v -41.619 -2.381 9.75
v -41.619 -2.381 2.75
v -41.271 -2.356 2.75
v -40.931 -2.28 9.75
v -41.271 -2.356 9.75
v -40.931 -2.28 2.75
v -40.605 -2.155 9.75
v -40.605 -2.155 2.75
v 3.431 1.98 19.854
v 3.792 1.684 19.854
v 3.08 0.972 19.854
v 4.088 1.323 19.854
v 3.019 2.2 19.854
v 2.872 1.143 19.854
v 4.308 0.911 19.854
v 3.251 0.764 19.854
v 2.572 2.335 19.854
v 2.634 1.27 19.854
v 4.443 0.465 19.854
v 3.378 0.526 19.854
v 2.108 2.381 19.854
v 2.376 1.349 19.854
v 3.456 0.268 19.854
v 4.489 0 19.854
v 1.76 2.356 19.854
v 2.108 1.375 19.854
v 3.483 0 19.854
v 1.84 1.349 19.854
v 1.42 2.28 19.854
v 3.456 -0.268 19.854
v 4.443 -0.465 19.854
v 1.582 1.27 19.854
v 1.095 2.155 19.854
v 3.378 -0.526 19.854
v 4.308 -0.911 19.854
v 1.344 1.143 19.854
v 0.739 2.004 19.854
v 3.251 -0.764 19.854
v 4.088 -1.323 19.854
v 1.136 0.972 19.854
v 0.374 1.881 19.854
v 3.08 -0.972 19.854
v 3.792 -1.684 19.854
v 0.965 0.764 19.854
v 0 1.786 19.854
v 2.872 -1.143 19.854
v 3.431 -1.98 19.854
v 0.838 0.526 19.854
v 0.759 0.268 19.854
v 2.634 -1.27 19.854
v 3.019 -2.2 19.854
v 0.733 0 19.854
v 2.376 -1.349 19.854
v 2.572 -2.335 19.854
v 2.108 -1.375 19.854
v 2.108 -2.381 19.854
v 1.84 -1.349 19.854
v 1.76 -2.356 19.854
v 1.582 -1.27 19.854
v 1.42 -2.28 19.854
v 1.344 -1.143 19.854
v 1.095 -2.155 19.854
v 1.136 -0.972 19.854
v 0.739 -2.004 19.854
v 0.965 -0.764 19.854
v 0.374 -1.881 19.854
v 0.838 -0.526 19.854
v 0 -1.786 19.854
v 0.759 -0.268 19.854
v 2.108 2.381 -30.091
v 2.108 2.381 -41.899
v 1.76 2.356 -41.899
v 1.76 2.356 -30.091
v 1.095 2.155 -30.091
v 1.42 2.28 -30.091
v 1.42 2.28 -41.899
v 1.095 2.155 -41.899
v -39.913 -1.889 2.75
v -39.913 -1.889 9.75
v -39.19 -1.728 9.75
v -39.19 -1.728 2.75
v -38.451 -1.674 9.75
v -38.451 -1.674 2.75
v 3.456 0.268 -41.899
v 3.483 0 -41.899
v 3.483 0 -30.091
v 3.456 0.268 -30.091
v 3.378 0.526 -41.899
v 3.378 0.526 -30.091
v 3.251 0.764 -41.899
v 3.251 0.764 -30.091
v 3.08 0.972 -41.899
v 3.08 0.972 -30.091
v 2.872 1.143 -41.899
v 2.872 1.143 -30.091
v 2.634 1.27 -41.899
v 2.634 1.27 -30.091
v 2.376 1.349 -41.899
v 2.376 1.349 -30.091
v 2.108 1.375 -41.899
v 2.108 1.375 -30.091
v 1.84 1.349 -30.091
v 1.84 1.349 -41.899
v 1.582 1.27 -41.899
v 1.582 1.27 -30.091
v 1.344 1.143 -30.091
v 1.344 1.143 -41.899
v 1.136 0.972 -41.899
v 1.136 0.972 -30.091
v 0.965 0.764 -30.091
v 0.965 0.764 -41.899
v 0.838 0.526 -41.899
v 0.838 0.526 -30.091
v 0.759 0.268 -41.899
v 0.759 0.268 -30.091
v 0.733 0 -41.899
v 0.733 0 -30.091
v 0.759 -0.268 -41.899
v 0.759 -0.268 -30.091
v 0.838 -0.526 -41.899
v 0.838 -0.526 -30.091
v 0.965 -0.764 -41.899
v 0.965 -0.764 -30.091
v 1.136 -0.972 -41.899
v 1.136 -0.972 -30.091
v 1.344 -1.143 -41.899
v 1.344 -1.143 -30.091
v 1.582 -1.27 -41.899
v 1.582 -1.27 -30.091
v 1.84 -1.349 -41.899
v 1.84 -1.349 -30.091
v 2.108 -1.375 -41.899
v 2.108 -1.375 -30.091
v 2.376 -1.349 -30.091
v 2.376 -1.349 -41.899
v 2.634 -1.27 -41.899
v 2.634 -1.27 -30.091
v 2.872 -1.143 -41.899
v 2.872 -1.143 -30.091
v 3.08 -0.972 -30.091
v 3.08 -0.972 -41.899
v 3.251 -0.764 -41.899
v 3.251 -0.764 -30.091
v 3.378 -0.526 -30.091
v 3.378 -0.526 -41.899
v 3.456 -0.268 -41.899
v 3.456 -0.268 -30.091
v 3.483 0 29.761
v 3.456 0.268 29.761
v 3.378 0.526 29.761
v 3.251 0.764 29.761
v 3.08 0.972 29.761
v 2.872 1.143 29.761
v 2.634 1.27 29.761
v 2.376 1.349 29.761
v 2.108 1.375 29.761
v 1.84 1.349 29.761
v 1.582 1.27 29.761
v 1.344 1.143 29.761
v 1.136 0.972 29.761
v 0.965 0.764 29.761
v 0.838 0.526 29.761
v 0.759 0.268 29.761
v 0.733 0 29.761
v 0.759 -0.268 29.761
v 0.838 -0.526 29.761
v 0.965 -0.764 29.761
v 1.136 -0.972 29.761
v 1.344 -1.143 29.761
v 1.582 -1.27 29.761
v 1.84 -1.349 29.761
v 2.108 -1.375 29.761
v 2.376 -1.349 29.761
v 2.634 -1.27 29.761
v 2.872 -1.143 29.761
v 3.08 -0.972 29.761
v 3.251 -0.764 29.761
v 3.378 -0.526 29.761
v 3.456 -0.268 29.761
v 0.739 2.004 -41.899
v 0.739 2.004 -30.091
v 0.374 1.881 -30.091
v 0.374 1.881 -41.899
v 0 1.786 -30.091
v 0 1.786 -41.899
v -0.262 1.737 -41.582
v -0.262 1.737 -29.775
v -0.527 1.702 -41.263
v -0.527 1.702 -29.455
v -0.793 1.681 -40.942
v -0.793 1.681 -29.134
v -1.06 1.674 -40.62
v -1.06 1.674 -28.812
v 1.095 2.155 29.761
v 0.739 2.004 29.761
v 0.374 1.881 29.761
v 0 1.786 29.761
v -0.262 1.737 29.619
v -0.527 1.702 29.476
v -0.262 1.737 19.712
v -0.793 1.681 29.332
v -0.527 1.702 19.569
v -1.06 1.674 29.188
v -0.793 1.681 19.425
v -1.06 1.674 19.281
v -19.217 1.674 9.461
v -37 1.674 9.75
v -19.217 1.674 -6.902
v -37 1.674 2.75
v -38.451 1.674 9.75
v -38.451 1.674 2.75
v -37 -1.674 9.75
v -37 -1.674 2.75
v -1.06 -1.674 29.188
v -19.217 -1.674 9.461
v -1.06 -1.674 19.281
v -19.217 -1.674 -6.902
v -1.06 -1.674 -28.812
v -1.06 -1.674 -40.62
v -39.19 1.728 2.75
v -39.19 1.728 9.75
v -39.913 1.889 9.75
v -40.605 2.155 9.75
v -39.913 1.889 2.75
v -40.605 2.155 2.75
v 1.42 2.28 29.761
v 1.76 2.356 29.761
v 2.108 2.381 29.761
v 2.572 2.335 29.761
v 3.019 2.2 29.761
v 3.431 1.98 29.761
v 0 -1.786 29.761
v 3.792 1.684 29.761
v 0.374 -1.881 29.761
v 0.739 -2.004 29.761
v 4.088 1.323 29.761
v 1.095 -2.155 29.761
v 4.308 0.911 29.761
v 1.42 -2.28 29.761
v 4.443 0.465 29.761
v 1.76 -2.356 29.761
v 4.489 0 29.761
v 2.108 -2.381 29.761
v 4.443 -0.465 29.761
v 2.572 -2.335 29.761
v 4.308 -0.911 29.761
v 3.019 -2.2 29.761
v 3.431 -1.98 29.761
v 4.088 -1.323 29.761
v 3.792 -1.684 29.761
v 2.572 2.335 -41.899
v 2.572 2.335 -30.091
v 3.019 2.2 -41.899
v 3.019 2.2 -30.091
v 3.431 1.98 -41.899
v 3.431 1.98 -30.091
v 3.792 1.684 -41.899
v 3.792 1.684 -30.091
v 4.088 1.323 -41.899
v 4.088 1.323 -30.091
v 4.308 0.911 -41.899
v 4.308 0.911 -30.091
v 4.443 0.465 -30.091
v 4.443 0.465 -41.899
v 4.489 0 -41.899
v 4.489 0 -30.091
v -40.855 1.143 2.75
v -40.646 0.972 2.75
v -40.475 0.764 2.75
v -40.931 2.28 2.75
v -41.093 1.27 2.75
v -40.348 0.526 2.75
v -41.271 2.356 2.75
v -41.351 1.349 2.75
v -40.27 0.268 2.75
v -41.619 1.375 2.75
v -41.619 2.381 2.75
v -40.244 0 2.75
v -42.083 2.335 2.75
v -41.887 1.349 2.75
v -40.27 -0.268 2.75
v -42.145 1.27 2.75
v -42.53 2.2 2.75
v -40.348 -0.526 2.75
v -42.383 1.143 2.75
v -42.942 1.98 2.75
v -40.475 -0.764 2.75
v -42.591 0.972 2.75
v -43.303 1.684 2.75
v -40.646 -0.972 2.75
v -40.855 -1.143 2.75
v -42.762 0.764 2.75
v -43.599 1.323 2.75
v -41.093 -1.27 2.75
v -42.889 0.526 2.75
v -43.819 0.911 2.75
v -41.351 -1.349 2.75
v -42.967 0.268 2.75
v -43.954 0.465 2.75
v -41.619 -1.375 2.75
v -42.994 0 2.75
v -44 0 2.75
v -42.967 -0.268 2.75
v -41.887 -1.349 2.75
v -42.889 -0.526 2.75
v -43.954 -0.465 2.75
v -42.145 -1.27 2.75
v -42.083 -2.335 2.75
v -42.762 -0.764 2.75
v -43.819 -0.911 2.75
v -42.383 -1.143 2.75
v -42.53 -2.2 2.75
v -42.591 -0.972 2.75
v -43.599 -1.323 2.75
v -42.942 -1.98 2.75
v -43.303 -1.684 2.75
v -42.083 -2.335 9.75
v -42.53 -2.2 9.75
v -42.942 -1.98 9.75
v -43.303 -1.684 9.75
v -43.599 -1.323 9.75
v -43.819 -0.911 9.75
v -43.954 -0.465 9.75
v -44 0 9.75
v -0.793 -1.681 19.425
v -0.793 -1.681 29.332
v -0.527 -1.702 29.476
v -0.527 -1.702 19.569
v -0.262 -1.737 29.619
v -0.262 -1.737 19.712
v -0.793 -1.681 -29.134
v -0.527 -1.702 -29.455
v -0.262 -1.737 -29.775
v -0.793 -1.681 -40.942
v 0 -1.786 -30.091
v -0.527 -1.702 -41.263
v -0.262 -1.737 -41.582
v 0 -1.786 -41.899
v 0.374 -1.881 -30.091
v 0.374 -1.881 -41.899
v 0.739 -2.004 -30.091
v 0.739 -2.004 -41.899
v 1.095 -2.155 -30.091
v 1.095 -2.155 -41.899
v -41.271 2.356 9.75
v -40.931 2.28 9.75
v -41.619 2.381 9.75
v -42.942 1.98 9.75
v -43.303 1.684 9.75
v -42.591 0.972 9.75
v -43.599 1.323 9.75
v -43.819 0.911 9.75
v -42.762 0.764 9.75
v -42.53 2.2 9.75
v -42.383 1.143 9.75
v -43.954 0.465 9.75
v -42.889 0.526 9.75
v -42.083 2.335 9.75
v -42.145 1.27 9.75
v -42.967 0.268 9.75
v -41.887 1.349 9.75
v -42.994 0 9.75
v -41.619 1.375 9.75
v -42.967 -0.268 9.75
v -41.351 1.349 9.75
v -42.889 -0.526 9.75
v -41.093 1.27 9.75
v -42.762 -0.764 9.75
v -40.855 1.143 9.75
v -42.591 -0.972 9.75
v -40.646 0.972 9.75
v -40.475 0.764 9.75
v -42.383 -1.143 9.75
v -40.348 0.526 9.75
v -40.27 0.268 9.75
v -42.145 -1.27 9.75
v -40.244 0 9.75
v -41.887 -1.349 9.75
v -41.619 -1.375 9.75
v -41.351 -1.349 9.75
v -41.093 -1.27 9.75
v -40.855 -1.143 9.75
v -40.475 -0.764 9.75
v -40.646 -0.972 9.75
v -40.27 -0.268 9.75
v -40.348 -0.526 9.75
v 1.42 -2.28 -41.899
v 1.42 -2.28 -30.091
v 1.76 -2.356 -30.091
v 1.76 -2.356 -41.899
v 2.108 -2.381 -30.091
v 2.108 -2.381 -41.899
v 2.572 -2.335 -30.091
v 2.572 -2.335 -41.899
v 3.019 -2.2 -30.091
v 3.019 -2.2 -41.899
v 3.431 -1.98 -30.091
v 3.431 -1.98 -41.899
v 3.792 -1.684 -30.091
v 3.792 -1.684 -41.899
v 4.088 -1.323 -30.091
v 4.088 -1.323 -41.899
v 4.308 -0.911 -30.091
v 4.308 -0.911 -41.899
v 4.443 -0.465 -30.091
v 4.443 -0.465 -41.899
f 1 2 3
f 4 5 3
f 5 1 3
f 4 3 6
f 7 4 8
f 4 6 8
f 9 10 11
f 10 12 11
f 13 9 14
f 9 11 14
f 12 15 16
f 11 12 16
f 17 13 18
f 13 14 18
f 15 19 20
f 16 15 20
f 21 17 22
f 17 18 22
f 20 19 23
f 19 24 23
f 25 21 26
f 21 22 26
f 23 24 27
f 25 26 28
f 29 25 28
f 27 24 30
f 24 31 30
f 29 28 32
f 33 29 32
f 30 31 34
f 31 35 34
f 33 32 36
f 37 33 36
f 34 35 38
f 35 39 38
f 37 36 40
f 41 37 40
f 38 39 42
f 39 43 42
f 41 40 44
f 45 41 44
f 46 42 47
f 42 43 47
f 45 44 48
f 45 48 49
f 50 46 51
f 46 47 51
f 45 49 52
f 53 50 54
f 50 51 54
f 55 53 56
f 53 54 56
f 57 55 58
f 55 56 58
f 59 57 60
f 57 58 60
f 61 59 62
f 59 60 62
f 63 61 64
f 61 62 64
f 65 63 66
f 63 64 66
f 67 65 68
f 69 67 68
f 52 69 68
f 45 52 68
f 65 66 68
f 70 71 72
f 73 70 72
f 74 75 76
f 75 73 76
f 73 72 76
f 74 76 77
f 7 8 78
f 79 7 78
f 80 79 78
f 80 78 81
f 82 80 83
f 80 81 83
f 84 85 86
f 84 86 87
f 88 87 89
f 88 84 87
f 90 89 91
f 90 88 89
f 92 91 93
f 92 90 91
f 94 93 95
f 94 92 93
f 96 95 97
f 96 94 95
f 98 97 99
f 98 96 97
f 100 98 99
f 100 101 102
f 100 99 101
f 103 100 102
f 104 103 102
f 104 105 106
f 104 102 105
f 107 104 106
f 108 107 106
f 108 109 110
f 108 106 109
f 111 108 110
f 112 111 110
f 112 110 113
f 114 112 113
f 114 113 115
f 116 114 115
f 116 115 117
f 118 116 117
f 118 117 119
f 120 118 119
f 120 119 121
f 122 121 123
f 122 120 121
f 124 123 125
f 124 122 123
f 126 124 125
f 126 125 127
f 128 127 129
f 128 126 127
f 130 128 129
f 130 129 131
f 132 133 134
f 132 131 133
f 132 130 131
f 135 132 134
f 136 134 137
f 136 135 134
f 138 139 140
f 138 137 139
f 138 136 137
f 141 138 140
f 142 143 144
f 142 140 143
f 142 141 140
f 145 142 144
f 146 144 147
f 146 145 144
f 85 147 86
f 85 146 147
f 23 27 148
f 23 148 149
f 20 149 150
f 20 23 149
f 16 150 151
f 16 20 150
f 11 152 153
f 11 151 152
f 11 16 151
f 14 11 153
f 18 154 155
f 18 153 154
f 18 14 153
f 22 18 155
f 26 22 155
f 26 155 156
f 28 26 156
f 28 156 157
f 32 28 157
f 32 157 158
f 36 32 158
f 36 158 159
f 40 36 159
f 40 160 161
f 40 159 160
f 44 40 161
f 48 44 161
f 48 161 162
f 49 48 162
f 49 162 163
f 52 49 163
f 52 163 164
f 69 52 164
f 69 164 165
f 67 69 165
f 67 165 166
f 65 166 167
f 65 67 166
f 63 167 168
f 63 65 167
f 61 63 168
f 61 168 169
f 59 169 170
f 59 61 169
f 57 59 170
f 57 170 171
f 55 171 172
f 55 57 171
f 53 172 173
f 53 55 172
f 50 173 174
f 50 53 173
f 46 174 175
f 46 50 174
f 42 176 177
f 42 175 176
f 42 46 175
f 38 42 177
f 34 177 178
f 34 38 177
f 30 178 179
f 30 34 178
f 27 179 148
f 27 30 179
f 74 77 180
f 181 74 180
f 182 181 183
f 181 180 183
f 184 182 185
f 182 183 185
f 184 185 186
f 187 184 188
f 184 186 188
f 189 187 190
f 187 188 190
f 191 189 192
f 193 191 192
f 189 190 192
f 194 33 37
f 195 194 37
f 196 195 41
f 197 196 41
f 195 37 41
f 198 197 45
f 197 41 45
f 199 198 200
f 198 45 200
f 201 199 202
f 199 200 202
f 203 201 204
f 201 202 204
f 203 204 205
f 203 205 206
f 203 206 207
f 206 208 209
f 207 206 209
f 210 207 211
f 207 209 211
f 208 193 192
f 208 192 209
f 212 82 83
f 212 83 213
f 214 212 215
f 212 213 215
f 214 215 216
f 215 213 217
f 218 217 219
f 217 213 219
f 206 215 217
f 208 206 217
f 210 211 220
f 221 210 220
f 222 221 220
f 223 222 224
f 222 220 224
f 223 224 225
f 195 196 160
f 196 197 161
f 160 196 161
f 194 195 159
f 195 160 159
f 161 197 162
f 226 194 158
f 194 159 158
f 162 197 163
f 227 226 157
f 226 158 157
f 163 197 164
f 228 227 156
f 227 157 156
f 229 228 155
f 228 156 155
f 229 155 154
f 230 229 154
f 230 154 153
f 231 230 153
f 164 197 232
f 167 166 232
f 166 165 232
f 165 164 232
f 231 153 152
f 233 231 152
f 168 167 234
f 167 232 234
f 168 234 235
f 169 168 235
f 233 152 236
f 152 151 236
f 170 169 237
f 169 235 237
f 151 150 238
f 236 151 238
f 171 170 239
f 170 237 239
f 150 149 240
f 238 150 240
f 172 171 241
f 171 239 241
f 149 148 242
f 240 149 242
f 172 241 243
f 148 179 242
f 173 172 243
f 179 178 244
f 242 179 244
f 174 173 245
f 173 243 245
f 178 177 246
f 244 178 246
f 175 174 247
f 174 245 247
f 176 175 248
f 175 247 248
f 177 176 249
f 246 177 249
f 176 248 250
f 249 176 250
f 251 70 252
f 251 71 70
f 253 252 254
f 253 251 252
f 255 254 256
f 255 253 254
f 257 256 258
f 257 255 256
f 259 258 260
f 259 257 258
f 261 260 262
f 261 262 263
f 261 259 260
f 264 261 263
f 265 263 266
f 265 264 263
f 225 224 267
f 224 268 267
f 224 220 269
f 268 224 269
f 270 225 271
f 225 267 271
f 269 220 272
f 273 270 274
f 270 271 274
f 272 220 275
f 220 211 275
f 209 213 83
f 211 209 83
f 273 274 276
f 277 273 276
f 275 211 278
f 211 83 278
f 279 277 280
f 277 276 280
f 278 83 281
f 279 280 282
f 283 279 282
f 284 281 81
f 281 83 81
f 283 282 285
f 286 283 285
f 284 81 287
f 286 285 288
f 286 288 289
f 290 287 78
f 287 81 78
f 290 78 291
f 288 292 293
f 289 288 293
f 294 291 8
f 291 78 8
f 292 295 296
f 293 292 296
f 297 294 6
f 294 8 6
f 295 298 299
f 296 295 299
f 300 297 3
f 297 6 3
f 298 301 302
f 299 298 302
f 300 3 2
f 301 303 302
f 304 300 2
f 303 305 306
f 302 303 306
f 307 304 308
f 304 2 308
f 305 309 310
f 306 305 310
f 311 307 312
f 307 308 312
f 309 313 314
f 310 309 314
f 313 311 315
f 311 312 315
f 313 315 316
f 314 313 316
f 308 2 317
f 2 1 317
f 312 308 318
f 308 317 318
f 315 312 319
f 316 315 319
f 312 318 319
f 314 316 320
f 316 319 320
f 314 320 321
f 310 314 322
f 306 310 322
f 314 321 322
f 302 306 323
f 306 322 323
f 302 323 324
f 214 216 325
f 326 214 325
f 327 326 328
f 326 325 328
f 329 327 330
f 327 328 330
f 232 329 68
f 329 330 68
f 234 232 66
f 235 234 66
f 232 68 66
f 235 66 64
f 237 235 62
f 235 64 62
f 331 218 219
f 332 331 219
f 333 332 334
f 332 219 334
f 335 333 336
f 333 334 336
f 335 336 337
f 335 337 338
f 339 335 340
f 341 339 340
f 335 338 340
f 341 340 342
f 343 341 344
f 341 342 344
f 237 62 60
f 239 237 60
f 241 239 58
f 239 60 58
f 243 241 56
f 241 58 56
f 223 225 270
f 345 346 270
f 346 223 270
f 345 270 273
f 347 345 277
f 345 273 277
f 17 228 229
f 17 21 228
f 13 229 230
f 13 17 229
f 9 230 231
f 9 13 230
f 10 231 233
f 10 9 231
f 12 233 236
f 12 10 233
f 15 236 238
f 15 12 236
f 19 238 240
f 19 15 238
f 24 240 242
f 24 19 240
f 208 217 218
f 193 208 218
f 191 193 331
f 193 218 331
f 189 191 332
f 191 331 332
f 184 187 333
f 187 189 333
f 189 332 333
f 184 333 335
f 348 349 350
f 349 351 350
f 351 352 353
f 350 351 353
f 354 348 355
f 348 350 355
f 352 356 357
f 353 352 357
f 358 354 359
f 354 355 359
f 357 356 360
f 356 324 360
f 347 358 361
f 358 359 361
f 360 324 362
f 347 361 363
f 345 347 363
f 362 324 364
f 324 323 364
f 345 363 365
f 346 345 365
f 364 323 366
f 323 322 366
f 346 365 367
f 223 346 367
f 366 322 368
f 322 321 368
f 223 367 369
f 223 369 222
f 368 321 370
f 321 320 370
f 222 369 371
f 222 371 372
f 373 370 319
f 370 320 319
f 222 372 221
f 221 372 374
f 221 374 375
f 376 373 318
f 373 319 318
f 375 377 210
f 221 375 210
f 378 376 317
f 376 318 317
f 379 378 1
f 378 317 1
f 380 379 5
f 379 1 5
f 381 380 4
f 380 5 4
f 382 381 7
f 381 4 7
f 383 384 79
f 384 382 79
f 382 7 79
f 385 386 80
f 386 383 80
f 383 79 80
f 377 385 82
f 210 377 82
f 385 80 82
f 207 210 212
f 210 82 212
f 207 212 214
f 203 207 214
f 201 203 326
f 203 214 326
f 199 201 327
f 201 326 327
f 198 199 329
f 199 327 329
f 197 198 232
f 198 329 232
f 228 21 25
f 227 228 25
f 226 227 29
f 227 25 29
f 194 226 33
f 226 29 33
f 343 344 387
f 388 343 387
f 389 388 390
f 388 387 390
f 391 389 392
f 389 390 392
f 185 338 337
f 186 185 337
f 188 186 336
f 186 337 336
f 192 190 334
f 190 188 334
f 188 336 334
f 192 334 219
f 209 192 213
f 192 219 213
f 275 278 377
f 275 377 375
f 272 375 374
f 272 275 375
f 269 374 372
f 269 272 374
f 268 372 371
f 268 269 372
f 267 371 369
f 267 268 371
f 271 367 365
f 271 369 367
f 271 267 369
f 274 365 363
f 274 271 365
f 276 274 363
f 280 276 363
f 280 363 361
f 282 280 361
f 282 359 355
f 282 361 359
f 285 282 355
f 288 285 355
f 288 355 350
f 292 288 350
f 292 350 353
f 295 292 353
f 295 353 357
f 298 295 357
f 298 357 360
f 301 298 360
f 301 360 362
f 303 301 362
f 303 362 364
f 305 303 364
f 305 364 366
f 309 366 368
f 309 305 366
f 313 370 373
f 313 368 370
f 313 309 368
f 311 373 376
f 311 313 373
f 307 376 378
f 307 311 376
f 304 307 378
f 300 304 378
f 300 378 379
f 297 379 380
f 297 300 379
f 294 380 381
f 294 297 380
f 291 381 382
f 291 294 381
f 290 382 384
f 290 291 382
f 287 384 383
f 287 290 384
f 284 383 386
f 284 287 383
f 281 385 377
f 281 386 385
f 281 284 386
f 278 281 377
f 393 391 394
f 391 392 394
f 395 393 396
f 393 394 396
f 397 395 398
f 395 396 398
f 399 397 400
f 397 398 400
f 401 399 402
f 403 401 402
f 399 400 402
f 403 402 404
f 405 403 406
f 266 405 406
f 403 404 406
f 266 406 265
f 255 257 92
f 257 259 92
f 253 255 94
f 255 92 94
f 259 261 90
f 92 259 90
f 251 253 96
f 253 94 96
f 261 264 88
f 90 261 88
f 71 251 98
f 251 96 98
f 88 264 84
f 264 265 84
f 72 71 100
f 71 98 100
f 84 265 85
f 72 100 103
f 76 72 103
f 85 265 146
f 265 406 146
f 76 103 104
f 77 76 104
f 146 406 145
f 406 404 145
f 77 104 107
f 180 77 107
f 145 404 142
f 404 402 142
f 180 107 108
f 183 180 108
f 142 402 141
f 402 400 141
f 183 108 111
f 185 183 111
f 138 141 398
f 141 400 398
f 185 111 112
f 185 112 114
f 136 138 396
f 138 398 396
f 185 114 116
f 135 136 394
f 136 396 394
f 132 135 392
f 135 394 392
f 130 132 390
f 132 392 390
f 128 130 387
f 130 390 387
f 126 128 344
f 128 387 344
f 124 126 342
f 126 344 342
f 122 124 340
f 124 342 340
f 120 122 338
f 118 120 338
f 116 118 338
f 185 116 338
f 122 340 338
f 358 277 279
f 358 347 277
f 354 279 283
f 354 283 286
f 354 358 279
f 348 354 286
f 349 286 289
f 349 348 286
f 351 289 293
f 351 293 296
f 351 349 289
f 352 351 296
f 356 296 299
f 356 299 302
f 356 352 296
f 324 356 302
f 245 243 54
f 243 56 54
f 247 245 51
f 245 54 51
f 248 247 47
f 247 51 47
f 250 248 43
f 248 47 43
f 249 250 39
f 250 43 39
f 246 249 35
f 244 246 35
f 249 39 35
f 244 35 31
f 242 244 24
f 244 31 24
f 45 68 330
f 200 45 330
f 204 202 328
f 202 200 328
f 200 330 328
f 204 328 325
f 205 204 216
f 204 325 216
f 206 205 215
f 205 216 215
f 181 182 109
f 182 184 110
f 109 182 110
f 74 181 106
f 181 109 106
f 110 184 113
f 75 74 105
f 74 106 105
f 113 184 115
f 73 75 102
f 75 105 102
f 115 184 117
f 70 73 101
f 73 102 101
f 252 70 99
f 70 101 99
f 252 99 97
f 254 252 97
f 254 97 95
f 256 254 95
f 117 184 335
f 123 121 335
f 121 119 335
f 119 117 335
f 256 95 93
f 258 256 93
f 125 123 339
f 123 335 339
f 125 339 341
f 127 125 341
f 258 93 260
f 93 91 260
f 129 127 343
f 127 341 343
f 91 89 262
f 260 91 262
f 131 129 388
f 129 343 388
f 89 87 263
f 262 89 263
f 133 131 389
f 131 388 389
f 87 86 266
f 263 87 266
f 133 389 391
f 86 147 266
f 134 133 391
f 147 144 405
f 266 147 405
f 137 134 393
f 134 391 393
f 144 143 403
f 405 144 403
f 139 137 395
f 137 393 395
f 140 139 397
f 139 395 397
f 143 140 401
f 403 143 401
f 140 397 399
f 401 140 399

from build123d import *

# Parameters (mm, degrees)
BOSS_EXTRUDE1_DEPTH      = 2.38125
BOSS_EXTRUDE1_DEPTH_BACK = 2.38125
CUT_EXTRUDE1_DEPTH       = 68.891743782
CUT_EXTRUDE1_DEPTH_BACK  = 68.891743782
SKETCH2_R                = 1.375
FILLET2_R                = 2.38125
CUT_EXTRUDE2_DEPTH       = 61.804572212
CUT_EXTRUDE2_DEPTH_BACK  = 61.804572212


with BuildPart() as part:
    # Sketch1 → Boss-Extrude1 (new, two sides: drawn at the far end of the back side and taken through both)
    with BuildSketch(Plane(origin=(0, 0, 0), x_dir=(1, 0, 0), z_dir=(0, 1, 0)).offset(-BOSS_EXTRUDE1_DEPTH_BACK)):
        Polygon((0, 41.898993428), (-37, -2.75), (-44, -2.75), (-44, -9.75), (-37, -9.75), (0, -29.761006572), (4.489108528, -29.761006572), (4.489108528, -19.854089936), (0, -19.854089936), (-19.216520838, -9.461064942), (-19.216520838, 6.902295225), (0, 30.091438809), (4.489108528, 30.091438809), (4.489108528, 41.898993428), align=None)
    extrude(amount=BOSS_EXTRUDE1_DEPTH + BOSS_EXTRUDE1_DEPTH_BACK)

    # Sketch2 → Cut-Extrude1 (cut, two sides: drawn at the far end of the back side and taken through both)
    with BuildSketch(Plane.XY.offset(9.75).offset(-CUT_EXTRUDE1_DEPTH_BACK)):
        with Locations((-41.61875, 0)):
            Circle(SKETCH2_R)
        with Locations((2.107858528, 0)):
            Circle(SKETCH2_R)
    extrude(amount=CUT_EXTRUDE1_DEPTH + CUT_EXTRUDE1_DEPTH_BACK, mode=Mode.SUBTRACT)

    # Fillet2
    fillet2_edges = [part.edges().sort_by_distance(p)[0] for p in [
        (4.489108528, 2.38125, -35.995216119),
        (4.489108528, -2.38125, -35.995216119),
        (4.489108528, -2.38125, 24.807548254),
        (4.489108528, 2.38125, 24.807548254),
        (-44, -2.38125, 6.25),
        (-44, 2.38125, 6.25),
    ]]
    fillet(fillet2_edges, radius=FILLET2_R - 0.0001)  # a hair under: the kernel refuses the full size

    # Sketch3 → Cut-Extrude2 (cut, two sides: drawn at the far end of the back side and taken through both)
    with BuildSketch(Plane.XY.offset(-CUT_EXTRUDE2_DEPTH_BACK)):
        with BuildLine():
            Line((-38.450893086, -1.673565387), (-1.059998386, -1.673565387))
            ThreePointArc((-1.059998386, -1.673565387), (0.043808846, -1.795357088), (1.094509688, -2.154872546))
            ThreePointArc((1.094509688, -2.154872546), (1.588695109, -2.323966632), (2.107858528, -2.38125))
            Line((2.107858528, -2.38125), (2.107858528, -4.833118282))
            Line((2.107858528, -4.833118282), (-41.61875, -4.833118282))
            Line((-41.61875, -4.833118282), (-41.61875, -2.38125))
            ThreePointArc((-41.61875, -2.38125), (-41.099586581, -2.323966632), (-40.60540116, -2.154872546))
            ThreePointArc((-40.60540116, -2.154872546), (-39.554700318, -1.795357088), (-38.450893086, -1.673565387))
        make_face()
        with BuildLine():
            Line((2.107858528, 4.833118282), (2.107858528, 2.38125))
            ThreePointArc((2.107858528, 2.38125), (1.588695109, 2.323966632), (1.094509688, 2.154872546))
            ThreePointArc((1.094509688, 2.154872546), (0.043808846, 1.795357088), (-1.059998386, 1.673565387))
            Line((-1.059998386, 1.673565387), (-38.450893086, 1.673565387))
            ThreePointArc((-38.450893086, 1.673565387), (-39.554700318, 1.795357088), (-40.60540116, 2.154872546))
            ThreePointArc((-40.60540116, 2.154872546), (-41.099586581, 2.323966632), (-41.61875, 2.38125))
            Line((-41.61875, 2.38125), (-41.61875, 4.833118282))
            Line((-41.61875, 4.833118282), (2.107858528, 4.833118282))
        make_face()
    extrude(amount=CUT_EXTRUDE2_DEPTH + CUT_EXTRUDE2_DEPTH_BACK, mode=Mode.SUBTRACT)


solid = part.part
